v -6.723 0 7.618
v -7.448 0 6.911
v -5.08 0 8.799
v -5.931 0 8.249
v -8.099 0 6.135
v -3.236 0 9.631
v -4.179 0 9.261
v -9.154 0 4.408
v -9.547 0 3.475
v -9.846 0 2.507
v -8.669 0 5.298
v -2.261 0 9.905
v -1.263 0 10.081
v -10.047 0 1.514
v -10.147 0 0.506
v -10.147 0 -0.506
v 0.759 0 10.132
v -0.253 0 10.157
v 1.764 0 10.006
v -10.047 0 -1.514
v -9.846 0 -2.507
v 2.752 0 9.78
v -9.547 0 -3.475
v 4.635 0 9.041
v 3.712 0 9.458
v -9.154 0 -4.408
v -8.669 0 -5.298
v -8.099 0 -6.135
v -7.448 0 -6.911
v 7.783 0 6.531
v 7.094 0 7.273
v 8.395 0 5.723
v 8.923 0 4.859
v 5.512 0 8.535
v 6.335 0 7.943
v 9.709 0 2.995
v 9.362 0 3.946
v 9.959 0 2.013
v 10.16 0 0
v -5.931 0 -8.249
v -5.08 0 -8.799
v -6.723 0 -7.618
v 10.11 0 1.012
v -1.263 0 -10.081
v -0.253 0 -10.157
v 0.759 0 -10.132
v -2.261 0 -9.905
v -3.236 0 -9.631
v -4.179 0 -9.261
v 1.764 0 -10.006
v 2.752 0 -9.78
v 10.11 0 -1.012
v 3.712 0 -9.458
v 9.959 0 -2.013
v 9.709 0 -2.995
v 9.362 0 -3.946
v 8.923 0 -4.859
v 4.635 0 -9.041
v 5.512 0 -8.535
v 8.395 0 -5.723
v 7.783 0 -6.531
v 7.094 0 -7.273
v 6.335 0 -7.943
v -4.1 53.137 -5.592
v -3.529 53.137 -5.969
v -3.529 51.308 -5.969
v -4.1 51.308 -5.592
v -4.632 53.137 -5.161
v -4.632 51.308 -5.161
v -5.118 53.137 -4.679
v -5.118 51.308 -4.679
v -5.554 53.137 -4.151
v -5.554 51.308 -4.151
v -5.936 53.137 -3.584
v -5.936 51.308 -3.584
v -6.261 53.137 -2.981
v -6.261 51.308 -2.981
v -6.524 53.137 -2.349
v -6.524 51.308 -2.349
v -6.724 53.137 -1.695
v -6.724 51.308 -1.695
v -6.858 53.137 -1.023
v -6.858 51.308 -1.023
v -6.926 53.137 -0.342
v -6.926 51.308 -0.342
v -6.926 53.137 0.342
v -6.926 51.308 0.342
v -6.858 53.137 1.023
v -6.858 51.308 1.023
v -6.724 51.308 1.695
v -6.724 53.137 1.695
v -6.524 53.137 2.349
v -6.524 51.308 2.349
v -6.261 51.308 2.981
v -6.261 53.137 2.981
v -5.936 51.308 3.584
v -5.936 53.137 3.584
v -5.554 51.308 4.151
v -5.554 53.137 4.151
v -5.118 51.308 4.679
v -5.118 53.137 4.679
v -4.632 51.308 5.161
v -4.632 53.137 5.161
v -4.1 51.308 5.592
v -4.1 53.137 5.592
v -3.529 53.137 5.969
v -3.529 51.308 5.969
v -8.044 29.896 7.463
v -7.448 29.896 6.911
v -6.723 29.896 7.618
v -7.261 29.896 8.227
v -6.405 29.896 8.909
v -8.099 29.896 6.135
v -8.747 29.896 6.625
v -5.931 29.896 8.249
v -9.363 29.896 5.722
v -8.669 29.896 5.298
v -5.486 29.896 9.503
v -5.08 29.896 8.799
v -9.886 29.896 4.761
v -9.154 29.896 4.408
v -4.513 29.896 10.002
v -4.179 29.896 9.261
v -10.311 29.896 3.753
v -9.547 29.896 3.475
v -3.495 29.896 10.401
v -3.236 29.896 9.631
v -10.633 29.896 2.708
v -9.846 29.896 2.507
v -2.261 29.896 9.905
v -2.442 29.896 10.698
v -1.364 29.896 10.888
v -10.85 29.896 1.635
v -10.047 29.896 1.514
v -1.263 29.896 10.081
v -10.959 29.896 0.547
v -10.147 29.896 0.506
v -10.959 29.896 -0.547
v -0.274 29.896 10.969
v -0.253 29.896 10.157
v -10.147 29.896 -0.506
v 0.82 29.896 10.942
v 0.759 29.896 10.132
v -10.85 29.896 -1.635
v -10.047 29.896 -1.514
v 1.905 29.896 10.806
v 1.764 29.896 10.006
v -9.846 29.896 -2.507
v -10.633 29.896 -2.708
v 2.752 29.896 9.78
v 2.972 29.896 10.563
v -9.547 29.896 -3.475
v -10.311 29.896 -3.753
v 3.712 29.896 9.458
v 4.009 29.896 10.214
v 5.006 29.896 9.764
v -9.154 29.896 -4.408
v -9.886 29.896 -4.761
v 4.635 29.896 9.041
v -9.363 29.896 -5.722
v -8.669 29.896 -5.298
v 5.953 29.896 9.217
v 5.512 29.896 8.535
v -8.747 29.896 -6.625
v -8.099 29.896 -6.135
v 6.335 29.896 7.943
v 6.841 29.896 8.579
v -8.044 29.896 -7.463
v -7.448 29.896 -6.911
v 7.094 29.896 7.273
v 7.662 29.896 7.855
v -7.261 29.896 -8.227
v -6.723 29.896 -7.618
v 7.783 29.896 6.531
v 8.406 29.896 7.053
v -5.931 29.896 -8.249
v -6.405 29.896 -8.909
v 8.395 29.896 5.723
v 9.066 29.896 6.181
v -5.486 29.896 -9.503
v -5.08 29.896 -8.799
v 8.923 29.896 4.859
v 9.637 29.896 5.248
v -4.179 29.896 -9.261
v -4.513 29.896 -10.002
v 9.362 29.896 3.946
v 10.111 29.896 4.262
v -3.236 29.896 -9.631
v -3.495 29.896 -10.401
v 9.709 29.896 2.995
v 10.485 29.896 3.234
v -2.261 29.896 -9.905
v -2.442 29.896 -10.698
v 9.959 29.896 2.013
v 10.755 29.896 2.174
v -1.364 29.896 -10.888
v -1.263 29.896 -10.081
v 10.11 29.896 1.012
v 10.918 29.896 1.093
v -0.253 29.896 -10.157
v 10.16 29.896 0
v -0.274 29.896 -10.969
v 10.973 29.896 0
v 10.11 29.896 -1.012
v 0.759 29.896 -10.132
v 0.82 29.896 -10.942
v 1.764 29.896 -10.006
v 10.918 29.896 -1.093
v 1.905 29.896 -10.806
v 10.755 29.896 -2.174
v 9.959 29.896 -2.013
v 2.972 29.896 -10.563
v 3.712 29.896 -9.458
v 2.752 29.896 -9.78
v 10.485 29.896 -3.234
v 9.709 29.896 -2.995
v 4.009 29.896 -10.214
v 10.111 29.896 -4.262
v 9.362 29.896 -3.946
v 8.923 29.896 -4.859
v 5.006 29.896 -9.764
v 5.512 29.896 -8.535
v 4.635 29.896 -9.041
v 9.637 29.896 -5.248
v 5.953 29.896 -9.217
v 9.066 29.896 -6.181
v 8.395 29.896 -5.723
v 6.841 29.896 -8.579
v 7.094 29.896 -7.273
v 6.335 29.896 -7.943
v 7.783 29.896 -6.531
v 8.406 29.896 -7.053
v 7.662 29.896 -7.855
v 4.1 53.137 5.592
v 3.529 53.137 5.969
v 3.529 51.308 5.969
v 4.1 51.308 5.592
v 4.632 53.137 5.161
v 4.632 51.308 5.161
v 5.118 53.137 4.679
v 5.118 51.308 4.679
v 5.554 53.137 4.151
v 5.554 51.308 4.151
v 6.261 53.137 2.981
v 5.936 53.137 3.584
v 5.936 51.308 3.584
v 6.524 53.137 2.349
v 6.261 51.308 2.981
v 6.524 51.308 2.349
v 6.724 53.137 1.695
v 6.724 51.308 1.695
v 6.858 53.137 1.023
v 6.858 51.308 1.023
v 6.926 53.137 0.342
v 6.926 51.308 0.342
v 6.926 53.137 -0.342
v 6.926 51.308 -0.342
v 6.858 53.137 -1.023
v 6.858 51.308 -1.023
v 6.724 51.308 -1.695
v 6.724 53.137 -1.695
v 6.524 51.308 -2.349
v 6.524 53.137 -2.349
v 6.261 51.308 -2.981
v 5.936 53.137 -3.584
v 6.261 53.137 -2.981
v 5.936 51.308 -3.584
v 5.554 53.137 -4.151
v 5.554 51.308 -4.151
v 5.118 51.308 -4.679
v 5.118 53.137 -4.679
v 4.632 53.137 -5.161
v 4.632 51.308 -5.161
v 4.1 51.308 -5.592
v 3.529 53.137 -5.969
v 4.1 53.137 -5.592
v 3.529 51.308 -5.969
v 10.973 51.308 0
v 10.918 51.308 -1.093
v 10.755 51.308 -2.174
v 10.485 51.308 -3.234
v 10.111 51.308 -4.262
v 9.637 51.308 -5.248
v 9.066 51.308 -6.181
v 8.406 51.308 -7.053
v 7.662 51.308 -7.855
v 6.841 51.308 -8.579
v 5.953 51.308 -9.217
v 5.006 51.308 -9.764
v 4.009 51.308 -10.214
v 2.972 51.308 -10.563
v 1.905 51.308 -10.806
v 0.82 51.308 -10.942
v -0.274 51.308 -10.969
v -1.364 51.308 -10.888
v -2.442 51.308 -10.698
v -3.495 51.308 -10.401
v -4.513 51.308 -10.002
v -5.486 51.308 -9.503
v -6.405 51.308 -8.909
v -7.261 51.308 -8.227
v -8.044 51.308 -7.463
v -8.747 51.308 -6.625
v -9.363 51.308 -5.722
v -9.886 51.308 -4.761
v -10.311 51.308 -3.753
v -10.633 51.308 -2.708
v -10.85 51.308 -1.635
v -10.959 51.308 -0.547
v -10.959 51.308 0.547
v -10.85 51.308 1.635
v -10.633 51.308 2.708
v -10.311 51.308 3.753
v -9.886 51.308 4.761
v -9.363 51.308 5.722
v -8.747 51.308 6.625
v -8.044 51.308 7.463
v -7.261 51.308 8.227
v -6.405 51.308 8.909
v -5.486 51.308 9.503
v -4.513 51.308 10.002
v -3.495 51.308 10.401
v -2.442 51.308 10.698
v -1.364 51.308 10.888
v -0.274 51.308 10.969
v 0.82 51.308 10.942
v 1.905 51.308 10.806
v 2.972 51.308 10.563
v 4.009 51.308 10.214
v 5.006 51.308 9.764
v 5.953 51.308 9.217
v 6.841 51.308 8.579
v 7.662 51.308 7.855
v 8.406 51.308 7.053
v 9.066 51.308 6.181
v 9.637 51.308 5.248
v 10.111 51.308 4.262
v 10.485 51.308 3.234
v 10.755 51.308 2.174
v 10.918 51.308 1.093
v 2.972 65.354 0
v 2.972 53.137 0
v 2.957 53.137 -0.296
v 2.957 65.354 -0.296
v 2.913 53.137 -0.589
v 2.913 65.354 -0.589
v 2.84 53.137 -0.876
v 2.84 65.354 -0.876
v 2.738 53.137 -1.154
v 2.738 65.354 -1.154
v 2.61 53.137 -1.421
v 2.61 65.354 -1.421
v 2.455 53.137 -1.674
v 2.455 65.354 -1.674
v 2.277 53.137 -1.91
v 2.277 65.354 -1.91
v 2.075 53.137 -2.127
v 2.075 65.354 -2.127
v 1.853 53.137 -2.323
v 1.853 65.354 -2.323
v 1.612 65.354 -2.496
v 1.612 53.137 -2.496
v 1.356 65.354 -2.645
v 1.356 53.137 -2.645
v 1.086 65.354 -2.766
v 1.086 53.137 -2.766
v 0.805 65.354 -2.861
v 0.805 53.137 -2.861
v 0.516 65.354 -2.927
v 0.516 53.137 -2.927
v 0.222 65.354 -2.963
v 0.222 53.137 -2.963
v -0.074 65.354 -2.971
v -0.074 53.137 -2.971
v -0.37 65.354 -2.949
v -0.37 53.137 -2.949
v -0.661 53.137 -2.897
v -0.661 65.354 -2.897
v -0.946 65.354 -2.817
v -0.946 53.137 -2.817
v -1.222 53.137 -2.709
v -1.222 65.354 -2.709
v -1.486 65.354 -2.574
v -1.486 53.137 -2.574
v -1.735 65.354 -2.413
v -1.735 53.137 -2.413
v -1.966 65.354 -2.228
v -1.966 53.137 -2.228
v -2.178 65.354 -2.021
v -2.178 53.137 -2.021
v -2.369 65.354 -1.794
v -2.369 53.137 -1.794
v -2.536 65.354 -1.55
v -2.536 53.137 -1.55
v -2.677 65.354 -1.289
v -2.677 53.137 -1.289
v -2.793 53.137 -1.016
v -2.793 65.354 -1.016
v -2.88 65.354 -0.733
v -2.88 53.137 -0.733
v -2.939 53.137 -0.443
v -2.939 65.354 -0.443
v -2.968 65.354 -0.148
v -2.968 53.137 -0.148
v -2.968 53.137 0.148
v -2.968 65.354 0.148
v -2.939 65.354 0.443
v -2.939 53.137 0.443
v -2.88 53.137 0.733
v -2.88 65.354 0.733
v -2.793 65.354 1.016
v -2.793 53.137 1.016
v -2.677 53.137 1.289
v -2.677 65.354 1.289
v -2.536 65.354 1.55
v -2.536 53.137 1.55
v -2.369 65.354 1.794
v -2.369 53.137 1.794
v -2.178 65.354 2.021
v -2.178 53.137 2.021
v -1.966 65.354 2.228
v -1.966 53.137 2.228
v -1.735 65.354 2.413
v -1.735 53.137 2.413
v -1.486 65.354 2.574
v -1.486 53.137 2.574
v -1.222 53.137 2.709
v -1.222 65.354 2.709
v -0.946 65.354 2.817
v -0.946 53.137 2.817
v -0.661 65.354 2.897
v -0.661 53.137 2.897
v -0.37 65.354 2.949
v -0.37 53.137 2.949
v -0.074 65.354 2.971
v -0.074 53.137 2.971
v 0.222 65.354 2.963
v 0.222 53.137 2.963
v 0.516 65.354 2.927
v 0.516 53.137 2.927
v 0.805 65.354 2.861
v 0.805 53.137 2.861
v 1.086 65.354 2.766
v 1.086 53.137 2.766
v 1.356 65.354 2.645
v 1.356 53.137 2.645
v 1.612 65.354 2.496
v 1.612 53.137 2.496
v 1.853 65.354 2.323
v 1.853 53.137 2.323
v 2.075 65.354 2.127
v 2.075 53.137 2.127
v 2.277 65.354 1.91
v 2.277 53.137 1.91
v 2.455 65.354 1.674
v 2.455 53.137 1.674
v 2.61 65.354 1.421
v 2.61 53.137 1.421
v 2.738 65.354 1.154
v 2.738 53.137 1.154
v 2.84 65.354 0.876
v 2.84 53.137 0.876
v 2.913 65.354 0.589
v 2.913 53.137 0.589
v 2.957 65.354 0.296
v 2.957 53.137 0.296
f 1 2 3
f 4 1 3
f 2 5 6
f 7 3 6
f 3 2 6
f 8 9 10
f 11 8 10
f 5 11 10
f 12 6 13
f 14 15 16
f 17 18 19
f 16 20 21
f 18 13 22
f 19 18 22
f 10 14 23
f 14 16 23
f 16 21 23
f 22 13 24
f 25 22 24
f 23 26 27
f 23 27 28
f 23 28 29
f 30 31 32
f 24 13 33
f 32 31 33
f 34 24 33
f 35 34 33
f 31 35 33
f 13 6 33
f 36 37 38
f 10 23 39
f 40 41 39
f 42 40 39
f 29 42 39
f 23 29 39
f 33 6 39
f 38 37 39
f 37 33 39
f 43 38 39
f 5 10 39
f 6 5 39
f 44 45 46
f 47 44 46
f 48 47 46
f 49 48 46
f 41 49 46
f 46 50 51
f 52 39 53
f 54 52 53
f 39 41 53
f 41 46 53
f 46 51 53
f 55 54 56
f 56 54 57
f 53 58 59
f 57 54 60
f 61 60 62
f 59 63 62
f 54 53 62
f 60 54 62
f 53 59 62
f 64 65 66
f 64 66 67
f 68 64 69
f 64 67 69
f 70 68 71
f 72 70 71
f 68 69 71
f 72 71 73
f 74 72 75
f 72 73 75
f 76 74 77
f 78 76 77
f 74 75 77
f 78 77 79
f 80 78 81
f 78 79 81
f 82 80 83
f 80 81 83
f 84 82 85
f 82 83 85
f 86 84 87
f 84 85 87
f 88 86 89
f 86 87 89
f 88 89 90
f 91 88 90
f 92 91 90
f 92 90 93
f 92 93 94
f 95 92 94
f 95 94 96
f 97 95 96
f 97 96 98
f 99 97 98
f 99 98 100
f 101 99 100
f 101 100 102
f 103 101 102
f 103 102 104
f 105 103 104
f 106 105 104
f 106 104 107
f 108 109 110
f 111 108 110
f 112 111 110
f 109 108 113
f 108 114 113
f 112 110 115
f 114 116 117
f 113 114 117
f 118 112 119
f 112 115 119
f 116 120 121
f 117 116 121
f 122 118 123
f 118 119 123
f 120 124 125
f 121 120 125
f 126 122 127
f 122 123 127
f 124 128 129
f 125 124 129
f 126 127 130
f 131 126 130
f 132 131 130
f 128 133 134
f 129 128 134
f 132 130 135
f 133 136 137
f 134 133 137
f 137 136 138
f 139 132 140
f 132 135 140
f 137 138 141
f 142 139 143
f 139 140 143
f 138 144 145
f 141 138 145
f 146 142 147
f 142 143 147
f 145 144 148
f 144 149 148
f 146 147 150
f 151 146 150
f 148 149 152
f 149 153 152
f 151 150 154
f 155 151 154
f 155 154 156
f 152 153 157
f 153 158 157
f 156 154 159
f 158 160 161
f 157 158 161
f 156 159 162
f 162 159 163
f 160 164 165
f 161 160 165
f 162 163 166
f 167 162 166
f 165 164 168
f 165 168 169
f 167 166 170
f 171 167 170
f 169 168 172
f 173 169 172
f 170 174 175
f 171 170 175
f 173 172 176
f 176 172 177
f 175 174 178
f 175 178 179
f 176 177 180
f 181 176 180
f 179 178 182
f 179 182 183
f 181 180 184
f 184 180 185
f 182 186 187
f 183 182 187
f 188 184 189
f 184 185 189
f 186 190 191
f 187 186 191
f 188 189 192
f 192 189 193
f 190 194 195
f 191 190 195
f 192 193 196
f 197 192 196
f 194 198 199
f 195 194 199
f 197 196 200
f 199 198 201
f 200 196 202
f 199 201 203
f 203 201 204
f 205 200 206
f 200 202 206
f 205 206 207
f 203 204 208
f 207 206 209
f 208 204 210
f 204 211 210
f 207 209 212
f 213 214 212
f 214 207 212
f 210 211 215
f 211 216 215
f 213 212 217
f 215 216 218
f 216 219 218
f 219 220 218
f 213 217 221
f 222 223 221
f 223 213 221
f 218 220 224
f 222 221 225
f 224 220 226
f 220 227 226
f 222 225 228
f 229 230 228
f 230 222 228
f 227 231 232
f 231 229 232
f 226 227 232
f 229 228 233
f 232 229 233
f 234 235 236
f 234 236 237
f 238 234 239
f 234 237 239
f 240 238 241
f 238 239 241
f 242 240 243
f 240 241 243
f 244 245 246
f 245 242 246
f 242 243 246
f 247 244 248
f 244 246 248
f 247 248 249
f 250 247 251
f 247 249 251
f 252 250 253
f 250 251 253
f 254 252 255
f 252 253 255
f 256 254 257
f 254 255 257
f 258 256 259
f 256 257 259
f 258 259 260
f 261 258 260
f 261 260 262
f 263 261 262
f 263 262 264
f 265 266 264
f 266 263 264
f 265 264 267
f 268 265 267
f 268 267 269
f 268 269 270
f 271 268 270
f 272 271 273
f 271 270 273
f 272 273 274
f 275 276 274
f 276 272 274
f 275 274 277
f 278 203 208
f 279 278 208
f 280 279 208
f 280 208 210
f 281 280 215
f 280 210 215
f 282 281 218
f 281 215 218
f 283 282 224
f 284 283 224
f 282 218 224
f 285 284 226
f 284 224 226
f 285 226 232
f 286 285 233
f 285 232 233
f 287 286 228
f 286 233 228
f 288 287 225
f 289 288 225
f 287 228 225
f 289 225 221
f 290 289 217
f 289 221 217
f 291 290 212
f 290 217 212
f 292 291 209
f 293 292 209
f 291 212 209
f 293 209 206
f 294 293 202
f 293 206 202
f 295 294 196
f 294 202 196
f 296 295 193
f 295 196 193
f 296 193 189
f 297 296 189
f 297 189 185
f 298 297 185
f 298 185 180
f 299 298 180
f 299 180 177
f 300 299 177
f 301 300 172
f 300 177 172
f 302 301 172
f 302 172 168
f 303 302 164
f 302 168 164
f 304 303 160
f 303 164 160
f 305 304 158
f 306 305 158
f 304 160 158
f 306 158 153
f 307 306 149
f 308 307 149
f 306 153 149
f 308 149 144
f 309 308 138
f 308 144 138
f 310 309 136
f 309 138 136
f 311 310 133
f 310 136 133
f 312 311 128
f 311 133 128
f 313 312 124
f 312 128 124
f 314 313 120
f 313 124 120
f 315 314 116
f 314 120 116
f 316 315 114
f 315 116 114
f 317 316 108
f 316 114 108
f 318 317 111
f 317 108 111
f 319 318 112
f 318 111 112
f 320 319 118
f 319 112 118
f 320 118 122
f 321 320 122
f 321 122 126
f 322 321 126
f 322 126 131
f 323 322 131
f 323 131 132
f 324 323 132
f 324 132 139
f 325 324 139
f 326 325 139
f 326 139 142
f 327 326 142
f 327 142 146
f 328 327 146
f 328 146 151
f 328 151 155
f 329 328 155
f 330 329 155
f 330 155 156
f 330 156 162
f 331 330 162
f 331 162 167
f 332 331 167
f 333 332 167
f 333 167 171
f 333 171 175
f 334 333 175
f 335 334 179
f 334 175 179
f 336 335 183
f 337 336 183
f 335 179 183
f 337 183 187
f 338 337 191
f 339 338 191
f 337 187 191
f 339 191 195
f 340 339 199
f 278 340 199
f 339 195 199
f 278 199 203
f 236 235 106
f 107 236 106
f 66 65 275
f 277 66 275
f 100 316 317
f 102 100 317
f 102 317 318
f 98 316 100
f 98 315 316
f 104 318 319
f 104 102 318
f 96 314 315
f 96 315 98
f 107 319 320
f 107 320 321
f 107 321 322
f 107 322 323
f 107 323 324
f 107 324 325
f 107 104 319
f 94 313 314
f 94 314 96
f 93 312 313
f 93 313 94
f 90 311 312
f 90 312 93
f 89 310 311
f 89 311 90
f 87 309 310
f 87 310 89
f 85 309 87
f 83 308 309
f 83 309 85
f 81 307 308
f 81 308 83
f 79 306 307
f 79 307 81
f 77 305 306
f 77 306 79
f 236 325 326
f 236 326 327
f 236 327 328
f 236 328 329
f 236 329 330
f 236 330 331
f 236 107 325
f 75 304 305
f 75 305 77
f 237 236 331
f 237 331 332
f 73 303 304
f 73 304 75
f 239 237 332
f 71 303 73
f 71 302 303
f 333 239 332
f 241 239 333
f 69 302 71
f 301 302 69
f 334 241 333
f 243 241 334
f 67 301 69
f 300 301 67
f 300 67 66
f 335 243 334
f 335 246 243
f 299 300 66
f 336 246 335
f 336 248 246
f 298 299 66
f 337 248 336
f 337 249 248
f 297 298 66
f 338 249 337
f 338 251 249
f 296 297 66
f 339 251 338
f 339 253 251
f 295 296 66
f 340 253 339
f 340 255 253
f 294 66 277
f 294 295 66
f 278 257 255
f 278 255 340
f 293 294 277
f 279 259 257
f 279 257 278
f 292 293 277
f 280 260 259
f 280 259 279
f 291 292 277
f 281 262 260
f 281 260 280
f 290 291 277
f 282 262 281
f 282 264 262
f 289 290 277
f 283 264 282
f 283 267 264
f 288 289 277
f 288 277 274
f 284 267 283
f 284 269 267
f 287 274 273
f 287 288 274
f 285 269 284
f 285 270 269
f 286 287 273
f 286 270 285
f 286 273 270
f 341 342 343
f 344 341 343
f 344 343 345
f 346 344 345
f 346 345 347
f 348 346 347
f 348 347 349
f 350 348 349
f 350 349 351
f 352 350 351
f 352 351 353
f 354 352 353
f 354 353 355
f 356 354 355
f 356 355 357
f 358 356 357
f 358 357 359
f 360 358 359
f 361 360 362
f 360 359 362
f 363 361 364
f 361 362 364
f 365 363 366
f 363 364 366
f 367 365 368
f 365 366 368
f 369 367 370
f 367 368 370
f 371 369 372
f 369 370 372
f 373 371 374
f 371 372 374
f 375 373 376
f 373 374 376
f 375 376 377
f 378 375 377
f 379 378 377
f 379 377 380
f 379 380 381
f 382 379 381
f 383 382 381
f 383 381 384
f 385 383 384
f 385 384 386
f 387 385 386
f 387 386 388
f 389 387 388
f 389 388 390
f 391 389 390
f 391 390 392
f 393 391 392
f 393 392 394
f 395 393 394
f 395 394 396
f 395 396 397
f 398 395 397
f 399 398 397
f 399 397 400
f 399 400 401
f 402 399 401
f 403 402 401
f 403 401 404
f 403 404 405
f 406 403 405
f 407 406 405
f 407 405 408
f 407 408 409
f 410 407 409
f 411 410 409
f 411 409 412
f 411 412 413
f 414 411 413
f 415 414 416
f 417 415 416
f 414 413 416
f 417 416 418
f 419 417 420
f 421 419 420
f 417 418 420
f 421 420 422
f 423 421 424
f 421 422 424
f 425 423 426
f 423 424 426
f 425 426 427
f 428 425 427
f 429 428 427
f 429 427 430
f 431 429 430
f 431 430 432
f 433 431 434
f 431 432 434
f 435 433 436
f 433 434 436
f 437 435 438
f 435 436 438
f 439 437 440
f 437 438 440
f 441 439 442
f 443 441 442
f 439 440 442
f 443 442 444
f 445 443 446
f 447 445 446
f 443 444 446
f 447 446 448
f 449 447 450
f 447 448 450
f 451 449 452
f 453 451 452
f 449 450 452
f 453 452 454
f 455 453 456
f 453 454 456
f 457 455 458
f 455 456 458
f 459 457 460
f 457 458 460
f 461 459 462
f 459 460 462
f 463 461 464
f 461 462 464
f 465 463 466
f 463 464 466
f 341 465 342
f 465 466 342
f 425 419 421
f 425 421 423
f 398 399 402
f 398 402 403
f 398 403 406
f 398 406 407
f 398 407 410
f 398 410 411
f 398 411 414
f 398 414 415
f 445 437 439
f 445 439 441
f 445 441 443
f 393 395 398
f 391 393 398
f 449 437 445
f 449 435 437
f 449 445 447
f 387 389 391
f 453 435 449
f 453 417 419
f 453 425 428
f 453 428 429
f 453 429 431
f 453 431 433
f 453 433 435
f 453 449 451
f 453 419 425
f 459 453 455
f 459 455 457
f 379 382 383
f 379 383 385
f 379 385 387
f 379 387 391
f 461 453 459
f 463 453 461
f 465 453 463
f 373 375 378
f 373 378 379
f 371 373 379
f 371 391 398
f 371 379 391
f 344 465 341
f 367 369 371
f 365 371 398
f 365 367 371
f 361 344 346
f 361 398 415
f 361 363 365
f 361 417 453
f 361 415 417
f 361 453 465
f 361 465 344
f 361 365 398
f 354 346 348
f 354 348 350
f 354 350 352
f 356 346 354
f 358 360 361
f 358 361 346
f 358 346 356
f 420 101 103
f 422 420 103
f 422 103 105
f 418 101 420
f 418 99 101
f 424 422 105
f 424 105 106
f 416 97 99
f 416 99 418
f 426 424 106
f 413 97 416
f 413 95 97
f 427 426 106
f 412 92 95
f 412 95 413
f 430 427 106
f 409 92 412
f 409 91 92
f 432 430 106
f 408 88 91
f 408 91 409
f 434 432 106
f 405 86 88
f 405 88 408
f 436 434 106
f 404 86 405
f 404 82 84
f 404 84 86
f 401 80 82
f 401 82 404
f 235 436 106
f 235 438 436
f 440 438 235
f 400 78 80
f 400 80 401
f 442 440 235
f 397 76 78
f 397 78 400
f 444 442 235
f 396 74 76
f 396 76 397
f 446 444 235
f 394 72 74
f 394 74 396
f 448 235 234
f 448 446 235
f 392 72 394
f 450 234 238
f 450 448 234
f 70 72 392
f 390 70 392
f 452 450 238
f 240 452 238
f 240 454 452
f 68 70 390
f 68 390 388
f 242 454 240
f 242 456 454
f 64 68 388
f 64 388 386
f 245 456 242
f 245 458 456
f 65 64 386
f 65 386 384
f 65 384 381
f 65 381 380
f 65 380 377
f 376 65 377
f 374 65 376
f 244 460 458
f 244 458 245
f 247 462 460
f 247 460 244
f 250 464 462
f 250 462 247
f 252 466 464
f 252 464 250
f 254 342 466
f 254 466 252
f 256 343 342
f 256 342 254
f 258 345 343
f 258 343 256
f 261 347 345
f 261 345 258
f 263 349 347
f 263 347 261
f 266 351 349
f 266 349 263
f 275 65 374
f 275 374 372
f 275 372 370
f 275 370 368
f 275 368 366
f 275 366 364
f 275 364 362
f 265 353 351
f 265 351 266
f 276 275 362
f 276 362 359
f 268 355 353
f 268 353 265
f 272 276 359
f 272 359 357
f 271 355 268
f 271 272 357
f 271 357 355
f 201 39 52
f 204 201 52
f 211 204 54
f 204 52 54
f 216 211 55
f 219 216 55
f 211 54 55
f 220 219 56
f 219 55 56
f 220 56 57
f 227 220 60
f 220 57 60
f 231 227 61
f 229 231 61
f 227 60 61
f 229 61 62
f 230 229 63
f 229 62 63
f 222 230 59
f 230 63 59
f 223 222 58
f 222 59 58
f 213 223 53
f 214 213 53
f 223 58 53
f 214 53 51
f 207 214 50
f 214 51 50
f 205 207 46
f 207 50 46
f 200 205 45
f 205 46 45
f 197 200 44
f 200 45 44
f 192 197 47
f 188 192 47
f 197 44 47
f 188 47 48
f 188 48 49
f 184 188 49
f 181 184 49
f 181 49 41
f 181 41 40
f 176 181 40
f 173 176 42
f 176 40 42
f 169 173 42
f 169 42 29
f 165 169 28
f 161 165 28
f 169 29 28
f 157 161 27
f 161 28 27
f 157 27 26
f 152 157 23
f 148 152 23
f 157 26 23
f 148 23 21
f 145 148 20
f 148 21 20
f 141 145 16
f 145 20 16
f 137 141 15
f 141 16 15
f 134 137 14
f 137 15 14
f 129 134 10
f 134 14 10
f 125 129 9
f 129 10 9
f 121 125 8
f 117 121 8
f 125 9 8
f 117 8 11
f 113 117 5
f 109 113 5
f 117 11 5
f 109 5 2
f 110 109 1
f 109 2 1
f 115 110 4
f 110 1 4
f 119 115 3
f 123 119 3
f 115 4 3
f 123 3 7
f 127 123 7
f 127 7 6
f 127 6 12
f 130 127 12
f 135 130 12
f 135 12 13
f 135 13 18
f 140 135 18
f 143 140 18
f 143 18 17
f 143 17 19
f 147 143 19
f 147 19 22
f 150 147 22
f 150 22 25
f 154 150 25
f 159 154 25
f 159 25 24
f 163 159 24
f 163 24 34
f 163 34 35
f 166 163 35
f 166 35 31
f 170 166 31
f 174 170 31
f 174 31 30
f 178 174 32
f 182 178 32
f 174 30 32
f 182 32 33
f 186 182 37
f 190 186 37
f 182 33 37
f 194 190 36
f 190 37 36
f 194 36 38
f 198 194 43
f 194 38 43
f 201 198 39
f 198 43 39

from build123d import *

# Parameters (mm, degrees)
SKETCH1_R           = 10.16
BOSS_EXTRUDE1_DEPTH = 29.8958
SKETCH2_R           = 10.9728
BOSS_EXTRUDE2_DEPTH = 21.4122
SKETCH3_R           = 6.9342
BOSS_EXTRUDE3_DEPTH = 1.8288
BOSS_EXTRUDE4_START = -53.1368
SKETCH4_R           = 2.9718
BOSS_EXTRUDE4_DEPTH = 65.3542
CUT_EXTRUDE1_DEPTH  = 1.8288


with BuildPart() as part:
    # Sketch1 → Boss-Extrude1 (new body)
    with BuildSketch(Plane(origin=(0, 0, 0), x_dir=(1, 0, 0), z_dir=(0, 1, 0))):
        Circle(SKETCH1_R)
    extrude(amount=BOSS_EXTRUDE1_DEPTH)

    # Sketch2 → Boss-Extrude2 (add)
    with BuildSketch(Plane(origin=(0, 29.8958, 0), x_dir=(1, 0, 0), z_dir=(0, 1, 0))):
        Circle(SKETCH2_R)
    extrude(amount=BOSS_EXTRUDE2_DEPTH)

    # Sketch3 → Boss-Extrude3 (add)
    with BuildSketch(Plane(origin=(0, 51.308, 0), x_dir=(1, 0, 0), z_dir=(0, 1, 0))):
        Circle(SKETCH3_R)
    extrude(amount=BOSS_EXTRUDE3_DEPTH)

    # Sketch4 → Boss-Extrude4 (add)
    with BuildSketch(Plane(origin=(0, 53.1368, 0), x_dir=(1, 0, 0), z_dir=(0, 1, 0)).offset(BOSS_EXTRUDE4_START)):
        Circle(SKETCH4_R)
    extrude(amount=BOSS_EXTRUDE4_DEPTH)

    # Sketch5 → Cut-Extrude1 (cut)
    with BuildSketch(Plane(origin=(0, 53.1368, 0), x_dir=(1, 0, 0), z_dir=(0, 1, 0))):
        with BuildLine():
            Line((-3.529046421, 5.969), (3.529046421, 5.969))
            ThreePointArc((3.529046421, 5.969), (0, 6.9342), (-3.529046421, 5.969))
        make_face()
        with BuildLine():
            Line((3.529046421, -5.969), (-3.529046421, -5.969))
            ThreePointArc((-3.529046421, -5.969), (0, -6.9342), (3.529046421, -5.969))
        make_face()
    extrude(amount=-CUT_EXTRUDE1_DEPTH, mode=Mode.SUBTRACT)


solid = part.part
